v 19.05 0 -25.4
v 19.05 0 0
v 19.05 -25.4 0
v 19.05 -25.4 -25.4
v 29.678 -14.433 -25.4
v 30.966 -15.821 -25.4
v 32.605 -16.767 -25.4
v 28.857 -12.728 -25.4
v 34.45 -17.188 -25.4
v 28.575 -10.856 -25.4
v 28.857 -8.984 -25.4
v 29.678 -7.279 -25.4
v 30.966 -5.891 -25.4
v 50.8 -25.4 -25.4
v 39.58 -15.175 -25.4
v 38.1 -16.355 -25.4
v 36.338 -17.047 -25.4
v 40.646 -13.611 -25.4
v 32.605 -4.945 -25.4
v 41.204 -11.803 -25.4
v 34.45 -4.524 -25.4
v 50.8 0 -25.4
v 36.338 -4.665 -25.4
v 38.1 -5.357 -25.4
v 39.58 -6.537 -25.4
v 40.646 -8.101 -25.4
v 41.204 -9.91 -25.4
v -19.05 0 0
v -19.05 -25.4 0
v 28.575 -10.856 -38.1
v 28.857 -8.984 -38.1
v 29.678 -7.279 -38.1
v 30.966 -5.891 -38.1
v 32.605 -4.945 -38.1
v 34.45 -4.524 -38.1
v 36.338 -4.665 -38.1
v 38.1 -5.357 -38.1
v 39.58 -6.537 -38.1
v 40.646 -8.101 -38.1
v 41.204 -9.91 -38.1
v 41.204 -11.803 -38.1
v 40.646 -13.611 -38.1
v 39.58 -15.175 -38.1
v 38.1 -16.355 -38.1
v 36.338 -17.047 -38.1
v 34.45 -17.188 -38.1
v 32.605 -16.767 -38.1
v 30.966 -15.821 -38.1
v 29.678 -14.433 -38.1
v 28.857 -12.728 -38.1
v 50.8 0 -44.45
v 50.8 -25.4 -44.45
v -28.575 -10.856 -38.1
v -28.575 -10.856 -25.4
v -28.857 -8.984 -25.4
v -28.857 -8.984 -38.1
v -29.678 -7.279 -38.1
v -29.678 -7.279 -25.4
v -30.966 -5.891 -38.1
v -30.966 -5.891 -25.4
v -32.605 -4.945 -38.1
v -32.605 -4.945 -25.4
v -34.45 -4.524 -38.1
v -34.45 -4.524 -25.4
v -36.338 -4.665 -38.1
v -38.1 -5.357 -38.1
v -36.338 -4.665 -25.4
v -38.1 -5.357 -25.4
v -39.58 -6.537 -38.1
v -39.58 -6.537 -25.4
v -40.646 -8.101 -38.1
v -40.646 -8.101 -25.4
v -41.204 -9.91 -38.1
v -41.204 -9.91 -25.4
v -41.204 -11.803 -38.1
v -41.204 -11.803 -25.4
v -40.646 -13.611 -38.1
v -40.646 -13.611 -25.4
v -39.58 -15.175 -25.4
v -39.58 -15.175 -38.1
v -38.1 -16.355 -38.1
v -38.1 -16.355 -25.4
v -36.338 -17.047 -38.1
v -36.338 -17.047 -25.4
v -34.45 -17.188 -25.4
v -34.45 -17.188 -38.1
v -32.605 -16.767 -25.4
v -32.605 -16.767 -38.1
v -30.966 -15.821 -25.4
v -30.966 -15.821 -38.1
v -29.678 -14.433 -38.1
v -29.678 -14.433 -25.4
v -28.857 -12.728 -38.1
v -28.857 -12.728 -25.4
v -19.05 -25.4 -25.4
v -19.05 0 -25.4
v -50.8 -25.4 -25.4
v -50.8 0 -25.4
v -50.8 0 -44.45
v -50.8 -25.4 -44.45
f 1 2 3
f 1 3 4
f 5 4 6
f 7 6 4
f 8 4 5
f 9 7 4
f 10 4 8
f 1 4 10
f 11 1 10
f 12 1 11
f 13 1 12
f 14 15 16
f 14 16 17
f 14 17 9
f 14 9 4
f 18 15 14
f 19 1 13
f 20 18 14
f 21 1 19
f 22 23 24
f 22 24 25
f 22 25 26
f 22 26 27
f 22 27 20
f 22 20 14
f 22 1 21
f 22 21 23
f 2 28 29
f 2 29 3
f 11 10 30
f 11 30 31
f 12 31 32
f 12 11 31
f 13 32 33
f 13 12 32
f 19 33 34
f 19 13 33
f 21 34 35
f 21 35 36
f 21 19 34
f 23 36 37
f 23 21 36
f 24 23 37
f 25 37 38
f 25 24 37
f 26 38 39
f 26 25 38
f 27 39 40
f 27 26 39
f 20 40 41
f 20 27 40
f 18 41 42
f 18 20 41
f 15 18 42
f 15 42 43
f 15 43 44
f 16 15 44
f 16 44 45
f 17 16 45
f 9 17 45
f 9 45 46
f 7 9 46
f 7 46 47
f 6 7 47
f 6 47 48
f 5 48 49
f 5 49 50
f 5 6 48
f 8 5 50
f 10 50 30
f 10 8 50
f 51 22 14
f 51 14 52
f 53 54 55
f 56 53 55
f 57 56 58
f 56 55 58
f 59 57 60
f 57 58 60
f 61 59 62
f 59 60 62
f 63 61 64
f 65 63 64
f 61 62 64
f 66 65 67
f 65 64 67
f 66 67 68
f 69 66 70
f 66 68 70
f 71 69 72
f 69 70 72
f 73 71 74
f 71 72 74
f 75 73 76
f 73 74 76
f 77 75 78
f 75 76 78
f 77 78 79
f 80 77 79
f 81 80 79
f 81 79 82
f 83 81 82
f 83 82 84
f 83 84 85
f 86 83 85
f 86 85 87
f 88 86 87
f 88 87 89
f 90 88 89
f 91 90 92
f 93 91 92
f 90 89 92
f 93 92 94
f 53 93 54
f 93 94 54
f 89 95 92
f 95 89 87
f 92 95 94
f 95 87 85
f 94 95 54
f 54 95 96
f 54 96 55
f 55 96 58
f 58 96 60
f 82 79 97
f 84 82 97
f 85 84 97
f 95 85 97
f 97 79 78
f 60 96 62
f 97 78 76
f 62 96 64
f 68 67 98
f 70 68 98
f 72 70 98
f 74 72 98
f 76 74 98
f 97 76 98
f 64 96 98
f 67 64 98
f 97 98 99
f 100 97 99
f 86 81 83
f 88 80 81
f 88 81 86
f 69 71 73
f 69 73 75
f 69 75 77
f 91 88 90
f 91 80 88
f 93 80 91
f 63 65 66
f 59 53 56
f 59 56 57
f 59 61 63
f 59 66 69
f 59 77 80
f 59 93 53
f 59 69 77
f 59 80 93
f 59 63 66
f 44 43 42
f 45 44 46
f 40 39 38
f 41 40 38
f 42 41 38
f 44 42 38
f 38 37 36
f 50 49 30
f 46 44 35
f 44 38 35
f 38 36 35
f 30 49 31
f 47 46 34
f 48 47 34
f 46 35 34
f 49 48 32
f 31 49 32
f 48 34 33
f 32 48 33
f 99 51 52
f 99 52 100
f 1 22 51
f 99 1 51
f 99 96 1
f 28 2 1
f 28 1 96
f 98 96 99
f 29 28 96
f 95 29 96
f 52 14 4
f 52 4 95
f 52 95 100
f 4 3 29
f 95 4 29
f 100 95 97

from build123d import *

# Parameters (mm, degrees)
F1_DEPTH = 25.4
F2_R     = 6.35
F3_DEPTH = 12.7


with BuildPart() as f1:
    # F0 (on Front) → F1 (new body)
    with BuildSketch(Plane.XZ):
        Polygon((0, 0), (-19.05, 0), (-19.05, -25.4), (-50.8, -25.4), (-50.8, -44.45), (0, -44.45), align=None)
    extrude(amount=F1_DEPTH)

    # F2 (on face) → F3 (cut)
    with BuildSketch(Plane.XY.offset(-25.4)):
        with Locations((-34.925, -10.856094)):
            Circle(F2_R)
    extrude(amount=-F3_DEPTH, mode=Mode.SUBTRACT)

    # F4: F1 across plane


with BuildPart() as f1_1:
    add(f1.part)
    add(f1.part.mirror(Plane.YZ))


solid = f1_1.part
